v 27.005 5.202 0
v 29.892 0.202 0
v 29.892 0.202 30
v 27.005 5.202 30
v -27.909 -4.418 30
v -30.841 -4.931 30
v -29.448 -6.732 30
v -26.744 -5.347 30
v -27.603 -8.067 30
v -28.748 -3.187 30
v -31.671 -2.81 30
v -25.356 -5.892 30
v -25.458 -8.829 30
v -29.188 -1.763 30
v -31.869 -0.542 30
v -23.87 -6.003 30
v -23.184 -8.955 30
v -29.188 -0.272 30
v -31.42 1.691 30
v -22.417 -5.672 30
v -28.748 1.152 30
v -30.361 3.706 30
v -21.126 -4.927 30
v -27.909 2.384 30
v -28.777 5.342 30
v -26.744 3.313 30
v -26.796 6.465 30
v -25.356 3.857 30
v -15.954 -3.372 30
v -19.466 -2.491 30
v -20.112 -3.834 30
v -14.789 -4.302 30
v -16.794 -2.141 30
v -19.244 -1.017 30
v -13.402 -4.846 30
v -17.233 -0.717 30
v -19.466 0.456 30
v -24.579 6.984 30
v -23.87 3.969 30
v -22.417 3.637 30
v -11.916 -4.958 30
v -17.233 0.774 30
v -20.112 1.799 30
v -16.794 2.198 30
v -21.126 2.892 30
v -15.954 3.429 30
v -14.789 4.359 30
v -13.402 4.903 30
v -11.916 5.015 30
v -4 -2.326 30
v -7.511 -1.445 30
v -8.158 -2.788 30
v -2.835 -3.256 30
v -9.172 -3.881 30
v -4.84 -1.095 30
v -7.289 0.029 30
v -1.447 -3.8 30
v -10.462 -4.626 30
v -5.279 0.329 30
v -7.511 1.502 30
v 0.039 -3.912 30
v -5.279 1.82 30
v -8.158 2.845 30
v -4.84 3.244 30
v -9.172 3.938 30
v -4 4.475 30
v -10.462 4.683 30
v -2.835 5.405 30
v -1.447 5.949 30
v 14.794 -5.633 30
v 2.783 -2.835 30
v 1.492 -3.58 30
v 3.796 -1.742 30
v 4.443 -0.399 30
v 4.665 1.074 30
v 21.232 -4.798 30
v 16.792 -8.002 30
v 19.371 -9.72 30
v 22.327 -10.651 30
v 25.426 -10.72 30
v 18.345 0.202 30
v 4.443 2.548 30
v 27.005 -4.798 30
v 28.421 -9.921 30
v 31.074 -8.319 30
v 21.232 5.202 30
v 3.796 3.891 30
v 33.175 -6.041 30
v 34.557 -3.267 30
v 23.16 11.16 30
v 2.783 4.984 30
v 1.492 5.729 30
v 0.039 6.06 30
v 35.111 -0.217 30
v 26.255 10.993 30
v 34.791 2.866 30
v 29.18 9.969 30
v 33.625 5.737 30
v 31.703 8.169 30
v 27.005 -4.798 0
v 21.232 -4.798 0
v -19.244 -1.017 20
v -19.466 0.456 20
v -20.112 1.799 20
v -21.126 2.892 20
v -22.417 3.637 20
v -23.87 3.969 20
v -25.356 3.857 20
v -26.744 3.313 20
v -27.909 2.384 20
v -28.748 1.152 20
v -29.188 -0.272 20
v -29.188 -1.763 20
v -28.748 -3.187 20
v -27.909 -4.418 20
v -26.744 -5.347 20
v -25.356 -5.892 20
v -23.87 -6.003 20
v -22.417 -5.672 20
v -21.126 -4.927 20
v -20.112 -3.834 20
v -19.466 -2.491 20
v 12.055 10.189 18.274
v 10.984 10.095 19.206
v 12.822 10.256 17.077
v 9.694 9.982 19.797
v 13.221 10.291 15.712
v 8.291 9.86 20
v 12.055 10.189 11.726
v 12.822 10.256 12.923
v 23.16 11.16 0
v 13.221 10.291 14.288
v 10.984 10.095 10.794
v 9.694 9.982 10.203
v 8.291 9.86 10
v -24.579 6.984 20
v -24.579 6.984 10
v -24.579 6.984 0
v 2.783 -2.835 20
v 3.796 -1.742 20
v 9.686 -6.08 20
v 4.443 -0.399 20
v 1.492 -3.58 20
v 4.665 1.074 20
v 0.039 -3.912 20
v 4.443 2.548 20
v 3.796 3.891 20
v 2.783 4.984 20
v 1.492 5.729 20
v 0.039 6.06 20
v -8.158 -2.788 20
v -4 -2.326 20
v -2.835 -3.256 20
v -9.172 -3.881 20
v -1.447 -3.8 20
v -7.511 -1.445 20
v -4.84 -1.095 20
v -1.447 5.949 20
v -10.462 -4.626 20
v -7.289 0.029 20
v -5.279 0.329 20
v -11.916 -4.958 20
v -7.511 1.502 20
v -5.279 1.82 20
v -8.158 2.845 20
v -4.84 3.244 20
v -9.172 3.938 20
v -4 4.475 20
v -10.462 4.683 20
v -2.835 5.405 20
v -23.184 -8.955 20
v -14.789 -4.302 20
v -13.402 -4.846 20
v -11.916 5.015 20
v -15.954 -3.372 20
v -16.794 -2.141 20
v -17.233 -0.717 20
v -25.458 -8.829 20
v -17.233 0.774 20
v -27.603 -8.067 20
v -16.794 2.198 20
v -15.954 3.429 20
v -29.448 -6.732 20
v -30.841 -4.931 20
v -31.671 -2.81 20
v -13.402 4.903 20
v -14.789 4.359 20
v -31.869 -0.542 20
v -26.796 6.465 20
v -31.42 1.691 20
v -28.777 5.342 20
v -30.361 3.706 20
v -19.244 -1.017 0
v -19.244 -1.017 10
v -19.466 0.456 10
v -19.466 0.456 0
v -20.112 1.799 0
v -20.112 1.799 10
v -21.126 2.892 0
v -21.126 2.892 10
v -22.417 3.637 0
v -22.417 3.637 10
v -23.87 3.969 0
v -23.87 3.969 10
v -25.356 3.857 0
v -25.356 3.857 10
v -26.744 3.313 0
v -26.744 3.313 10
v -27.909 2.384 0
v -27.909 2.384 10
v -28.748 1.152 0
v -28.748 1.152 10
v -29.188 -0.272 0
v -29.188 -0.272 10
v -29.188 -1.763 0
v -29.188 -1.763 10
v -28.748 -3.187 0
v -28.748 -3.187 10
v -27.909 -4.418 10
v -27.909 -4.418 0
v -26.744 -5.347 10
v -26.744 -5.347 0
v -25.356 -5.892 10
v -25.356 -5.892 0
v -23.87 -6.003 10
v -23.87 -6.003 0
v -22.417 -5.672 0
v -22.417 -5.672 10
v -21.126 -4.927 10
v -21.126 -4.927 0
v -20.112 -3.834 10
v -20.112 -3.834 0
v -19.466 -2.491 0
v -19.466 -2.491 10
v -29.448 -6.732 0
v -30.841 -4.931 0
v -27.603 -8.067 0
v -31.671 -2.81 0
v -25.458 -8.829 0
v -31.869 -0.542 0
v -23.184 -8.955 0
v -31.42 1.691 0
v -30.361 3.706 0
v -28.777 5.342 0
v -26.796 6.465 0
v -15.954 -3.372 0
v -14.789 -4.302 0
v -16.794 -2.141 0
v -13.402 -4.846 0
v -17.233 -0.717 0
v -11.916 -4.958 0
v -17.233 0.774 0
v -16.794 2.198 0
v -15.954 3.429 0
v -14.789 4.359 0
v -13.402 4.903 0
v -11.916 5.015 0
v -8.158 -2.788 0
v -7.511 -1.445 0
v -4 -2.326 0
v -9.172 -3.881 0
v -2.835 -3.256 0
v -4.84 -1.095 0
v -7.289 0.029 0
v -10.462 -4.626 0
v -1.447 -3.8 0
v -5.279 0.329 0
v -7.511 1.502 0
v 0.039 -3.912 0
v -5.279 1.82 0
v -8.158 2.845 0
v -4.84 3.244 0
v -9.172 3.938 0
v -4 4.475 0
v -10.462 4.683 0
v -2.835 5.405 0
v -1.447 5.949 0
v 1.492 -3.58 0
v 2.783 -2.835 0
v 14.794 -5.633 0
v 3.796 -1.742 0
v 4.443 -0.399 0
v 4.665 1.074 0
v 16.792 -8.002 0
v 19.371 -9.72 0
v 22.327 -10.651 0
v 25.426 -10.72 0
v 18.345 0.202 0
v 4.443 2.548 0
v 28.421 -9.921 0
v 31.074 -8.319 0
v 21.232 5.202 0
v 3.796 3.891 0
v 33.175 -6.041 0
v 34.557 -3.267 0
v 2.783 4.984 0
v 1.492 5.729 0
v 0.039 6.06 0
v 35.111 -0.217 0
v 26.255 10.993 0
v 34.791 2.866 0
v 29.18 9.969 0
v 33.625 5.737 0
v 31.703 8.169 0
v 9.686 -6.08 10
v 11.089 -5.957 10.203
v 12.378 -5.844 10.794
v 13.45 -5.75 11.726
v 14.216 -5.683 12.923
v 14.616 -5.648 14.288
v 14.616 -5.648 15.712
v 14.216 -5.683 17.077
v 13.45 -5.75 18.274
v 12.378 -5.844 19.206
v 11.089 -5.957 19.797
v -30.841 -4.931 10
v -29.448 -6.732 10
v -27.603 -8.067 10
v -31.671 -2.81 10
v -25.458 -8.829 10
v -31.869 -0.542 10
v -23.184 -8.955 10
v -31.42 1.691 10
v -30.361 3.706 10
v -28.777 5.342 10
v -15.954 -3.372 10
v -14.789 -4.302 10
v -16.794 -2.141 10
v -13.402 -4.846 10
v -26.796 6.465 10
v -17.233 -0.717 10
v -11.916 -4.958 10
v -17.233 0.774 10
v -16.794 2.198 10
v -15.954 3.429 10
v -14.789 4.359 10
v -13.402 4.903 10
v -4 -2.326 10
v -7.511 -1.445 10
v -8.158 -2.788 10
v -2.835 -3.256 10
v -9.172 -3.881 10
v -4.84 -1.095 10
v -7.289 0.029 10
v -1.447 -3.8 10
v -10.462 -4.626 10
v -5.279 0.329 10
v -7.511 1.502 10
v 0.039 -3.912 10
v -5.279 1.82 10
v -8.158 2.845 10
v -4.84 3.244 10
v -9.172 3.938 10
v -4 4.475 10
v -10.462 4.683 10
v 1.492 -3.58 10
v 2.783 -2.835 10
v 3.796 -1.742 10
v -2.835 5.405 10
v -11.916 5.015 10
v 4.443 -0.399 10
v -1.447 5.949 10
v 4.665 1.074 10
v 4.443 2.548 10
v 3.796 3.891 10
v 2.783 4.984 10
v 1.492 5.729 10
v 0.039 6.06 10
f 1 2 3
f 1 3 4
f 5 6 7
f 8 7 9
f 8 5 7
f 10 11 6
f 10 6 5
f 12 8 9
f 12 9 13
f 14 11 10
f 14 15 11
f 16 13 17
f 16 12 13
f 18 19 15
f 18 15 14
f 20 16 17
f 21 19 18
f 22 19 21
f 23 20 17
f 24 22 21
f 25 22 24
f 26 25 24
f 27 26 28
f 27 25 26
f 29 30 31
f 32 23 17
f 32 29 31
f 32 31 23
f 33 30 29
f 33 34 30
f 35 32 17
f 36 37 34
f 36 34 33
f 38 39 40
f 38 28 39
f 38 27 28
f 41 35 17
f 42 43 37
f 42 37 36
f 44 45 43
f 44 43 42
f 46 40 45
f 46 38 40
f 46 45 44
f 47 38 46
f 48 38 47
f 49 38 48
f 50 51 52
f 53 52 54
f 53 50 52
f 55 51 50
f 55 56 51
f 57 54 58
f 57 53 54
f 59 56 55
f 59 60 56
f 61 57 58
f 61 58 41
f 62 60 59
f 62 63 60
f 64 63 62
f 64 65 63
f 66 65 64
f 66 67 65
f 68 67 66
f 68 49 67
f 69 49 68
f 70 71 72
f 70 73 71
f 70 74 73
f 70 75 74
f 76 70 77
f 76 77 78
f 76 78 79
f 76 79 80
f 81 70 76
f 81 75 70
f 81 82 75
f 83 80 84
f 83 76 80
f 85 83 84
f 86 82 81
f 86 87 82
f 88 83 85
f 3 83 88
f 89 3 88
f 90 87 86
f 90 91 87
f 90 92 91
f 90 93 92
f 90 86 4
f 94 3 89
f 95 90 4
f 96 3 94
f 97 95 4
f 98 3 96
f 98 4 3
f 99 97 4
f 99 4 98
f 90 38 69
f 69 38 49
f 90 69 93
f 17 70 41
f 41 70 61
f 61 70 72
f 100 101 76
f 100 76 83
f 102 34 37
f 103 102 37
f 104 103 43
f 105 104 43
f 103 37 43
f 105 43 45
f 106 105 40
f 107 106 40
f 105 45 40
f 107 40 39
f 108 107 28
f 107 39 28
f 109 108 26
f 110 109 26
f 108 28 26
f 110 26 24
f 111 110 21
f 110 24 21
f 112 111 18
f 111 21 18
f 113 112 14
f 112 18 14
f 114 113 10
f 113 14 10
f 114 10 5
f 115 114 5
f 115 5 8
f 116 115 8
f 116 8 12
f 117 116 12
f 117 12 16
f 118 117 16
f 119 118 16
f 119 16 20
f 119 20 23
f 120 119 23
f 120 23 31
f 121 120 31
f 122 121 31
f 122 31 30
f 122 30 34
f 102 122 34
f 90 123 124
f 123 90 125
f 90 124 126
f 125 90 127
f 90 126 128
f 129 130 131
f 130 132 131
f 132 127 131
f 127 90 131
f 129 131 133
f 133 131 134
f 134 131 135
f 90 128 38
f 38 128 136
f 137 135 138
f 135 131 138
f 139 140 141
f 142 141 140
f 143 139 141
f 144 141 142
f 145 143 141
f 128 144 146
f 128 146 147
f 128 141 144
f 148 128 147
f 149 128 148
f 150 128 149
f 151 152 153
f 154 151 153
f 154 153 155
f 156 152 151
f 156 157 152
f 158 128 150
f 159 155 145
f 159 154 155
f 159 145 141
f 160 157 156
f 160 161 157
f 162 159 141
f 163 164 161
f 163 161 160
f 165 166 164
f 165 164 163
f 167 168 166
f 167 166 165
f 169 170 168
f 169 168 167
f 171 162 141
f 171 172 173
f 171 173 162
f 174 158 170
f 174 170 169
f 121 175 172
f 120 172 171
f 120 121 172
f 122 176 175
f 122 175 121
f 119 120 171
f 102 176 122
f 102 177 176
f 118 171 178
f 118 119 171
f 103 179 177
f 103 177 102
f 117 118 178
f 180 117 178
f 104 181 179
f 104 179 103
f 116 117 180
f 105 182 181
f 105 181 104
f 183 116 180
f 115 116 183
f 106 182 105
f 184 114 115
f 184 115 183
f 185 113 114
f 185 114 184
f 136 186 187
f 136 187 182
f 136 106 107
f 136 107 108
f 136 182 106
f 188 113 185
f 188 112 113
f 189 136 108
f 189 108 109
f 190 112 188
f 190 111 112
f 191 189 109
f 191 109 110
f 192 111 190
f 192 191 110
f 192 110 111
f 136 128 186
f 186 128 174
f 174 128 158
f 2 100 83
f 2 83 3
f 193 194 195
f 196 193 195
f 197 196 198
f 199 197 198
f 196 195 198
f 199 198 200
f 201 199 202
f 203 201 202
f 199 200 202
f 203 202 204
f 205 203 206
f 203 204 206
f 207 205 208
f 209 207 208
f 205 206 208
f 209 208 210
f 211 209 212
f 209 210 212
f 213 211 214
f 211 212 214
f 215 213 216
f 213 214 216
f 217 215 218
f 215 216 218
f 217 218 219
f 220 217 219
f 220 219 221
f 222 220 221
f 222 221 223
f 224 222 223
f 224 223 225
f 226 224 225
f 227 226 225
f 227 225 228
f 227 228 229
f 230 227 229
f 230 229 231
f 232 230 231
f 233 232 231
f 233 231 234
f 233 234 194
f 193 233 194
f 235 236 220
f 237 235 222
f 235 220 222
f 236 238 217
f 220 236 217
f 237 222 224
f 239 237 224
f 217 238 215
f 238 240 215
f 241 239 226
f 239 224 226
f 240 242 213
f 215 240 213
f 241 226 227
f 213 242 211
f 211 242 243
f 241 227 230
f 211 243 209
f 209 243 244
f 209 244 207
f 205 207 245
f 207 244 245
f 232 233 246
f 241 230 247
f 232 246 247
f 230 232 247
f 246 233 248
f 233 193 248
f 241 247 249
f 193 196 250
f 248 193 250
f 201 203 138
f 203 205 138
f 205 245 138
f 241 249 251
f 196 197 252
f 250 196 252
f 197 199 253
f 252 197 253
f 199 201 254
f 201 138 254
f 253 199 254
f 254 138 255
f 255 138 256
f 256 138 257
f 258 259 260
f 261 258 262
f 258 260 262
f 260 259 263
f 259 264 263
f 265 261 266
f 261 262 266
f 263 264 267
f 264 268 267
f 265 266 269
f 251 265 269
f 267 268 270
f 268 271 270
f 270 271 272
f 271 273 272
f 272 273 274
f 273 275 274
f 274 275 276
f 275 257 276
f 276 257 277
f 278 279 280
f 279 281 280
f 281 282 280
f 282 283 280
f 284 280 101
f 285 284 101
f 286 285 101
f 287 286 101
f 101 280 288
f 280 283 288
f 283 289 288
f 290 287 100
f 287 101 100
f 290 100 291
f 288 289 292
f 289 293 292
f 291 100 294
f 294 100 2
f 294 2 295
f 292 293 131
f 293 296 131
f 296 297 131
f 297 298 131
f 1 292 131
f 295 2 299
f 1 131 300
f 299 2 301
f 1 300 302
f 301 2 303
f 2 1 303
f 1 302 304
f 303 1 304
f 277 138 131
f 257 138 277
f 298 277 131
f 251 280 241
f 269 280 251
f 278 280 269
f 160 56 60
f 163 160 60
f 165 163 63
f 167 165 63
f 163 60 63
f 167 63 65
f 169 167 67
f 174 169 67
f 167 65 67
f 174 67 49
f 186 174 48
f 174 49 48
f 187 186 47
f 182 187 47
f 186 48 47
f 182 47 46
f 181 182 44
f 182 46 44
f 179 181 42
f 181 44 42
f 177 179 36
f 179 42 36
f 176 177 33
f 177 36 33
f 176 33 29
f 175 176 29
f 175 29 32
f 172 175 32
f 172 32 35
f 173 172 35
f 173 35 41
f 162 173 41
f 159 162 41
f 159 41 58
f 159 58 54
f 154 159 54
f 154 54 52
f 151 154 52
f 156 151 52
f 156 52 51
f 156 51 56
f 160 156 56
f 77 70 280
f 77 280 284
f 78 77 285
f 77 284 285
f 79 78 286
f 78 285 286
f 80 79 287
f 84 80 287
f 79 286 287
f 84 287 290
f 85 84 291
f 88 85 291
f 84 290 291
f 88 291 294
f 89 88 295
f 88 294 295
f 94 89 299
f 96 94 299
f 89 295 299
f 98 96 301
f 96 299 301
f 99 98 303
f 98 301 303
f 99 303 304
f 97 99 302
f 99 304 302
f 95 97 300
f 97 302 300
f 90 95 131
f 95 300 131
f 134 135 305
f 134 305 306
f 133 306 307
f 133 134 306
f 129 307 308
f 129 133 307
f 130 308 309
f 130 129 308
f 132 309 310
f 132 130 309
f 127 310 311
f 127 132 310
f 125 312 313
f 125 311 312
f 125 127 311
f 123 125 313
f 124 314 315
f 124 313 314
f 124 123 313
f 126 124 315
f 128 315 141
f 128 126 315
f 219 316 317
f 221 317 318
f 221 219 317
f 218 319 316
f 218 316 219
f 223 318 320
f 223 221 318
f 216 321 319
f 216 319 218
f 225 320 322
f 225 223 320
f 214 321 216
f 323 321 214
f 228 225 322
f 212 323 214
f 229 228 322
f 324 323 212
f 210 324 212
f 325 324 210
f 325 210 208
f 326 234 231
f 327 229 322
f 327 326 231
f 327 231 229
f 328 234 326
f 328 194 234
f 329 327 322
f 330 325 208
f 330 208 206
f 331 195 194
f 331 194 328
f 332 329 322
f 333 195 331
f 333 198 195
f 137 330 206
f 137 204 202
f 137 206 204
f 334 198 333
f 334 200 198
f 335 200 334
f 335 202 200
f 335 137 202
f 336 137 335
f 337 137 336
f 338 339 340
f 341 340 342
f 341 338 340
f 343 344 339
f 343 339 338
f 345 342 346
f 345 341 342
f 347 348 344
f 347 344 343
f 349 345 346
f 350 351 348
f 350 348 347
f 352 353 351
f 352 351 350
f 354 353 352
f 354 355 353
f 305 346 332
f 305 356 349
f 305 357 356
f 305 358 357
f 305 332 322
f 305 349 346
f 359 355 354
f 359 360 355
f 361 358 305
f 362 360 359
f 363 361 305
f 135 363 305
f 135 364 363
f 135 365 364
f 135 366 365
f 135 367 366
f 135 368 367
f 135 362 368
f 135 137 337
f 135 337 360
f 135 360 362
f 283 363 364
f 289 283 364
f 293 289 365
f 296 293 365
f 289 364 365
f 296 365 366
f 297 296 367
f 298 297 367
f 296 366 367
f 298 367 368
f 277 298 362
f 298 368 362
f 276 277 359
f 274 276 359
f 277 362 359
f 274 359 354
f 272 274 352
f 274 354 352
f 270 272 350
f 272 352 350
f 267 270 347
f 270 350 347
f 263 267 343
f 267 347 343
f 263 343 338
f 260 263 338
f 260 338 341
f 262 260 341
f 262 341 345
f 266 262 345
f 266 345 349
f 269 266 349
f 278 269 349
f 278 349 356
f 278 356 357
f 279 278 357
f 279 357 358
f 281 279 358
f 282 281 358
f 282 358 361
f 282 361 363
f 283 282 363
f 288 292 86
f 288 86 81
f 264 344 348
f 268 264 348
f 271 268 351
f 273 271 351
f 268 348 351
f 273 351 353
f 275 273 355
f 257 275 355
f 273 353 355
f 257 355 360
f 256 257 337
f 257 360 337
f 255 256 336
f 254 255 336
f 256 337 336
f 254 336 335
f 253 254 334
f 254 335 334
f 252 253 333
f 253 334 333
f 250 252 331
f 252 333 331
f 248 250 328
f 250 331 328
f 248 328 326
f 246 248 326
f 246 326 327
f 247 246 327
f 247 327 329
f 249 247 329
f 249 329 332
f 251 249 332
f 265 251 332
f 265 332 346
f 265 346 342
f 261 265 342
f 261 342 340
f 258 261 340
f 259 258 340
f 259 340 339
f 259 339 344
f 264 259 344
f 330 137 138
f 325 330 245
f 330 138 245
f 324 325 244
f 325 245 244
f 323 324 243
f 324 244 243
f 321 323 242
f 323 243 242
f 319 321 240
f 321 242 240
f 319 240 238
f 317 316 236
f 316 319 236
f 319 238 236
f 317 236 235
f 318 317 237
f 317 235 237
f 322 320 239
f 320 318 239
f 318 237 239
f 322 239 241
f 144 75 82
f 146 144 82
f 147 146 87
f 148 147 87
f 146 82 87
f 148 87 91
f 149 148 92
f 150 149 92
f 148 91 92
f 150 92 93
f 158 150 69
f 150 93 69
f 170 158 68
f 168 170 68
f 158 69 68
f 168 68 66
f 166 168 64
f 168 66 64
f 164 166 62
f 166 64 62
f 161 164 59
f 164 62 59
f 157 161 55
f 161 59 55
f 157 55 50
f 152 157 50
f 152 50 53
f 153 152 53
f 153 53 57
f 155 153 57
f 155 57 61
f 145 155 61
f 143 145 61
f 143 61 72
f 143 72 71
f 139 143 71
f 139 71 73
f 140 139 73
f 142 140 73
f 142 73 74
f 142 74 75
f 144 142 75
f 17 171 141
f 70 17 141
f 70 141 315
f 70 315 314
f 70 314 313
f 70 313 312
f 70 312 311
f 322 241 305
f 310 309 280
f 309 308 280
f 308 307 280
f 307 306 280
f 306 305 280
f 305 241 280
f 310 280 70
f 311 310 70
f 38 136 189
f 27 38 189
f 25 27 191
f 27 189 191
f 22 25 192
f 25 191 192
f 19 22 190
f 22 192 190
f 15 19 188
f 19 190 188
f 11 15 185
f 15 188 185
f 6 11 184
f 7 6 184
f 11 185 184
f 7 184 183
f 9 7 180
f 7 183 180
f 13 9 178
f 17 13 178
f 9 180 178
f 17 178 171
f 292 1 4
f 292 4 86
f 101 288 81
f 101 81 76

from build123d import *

# Parameters (mm, degrees)
BOSS_EXTRUDE1_DEPTH = 30
CUT_EXTRUDE1_DEPTH  = 23.916854849
SKETCH3_R           = 5
CUT_EXTRUDE2_DEPTH  = 31


with BuildPart() as part:
    # Sketch1 → Boss-Extrude1 (new body)
    with BuildSketch(Plane.XY):
        with BuildLine():
            Line((23.159950064, 11.160474583), (-24.578582707, 6.983894152))
            ThreePointArc((-24.578582707, 6.983894152), (-31.85089435, -1.682909374), (-23.184090823, -8.955221017))
            Line((-23.184090823, -8.955221017), (14.793767169, -5.632588978))
            ThreePointArc((14.793767169, -5.632588978), (33.964469482, -4.702776608), (23.159950064, 11.160474583))
        make_face()
        Polygon((27.005414581, -4.797667096), (29.892165926, 0.202332904), (27.005414581, 5.202332904), (21.231911889, 5.202332904), (18.345160543, 0.202332904), (21.231911889, -4.797667096), align=None, mode=Mode.SUBTRACT)
    extrude(amount=BOSS_EXTRUDE1_DEPTH)

    # Sketch2 → Cut-Extrude1 (cut, through all)
    with BuildSketch(Plane(origin=(-0.793072196, 9.064856678, 0), x_dir=(0.996194698, 0.087155743, 0), z_dir=(-0.087155743, 0.996194698, 0))):
        with BuildLine():
            Line((-32.881194949, -10), (9.118805051, -10))
            ThreePointArc((9.118805051, -10), (14.118805051, -15), (9.118805051, -20))
            Line((9.118805051, -20), (-32.881194949, -20))
            Line((-32.881194949, -20), (-32.881194949, -10))
        make_face()
    extrude(amount=-CUT_EXTRUDE1_DEPTH, mode=Mode.SUBTRACT)

    # Sketch3 → Cut-Extrude2 (cut, through all)
    with BuildSketch(Plane.XY.offset(30)):
        with Locations((-24.243526624, -1.017350939)):
            Circle(SKETCH3_R)
        with Locations((-12.289190247, 0.028517974)):
            Circle(SKETCH3_R)
        with Locations((-0.33485387, 1.074386887)):
            Circle(SKETCH3_R)
    extrude(amount=-CUT_EXTRUDE2_DEPTH, mode=Mode.SUBTRACT)


solid = part.part
